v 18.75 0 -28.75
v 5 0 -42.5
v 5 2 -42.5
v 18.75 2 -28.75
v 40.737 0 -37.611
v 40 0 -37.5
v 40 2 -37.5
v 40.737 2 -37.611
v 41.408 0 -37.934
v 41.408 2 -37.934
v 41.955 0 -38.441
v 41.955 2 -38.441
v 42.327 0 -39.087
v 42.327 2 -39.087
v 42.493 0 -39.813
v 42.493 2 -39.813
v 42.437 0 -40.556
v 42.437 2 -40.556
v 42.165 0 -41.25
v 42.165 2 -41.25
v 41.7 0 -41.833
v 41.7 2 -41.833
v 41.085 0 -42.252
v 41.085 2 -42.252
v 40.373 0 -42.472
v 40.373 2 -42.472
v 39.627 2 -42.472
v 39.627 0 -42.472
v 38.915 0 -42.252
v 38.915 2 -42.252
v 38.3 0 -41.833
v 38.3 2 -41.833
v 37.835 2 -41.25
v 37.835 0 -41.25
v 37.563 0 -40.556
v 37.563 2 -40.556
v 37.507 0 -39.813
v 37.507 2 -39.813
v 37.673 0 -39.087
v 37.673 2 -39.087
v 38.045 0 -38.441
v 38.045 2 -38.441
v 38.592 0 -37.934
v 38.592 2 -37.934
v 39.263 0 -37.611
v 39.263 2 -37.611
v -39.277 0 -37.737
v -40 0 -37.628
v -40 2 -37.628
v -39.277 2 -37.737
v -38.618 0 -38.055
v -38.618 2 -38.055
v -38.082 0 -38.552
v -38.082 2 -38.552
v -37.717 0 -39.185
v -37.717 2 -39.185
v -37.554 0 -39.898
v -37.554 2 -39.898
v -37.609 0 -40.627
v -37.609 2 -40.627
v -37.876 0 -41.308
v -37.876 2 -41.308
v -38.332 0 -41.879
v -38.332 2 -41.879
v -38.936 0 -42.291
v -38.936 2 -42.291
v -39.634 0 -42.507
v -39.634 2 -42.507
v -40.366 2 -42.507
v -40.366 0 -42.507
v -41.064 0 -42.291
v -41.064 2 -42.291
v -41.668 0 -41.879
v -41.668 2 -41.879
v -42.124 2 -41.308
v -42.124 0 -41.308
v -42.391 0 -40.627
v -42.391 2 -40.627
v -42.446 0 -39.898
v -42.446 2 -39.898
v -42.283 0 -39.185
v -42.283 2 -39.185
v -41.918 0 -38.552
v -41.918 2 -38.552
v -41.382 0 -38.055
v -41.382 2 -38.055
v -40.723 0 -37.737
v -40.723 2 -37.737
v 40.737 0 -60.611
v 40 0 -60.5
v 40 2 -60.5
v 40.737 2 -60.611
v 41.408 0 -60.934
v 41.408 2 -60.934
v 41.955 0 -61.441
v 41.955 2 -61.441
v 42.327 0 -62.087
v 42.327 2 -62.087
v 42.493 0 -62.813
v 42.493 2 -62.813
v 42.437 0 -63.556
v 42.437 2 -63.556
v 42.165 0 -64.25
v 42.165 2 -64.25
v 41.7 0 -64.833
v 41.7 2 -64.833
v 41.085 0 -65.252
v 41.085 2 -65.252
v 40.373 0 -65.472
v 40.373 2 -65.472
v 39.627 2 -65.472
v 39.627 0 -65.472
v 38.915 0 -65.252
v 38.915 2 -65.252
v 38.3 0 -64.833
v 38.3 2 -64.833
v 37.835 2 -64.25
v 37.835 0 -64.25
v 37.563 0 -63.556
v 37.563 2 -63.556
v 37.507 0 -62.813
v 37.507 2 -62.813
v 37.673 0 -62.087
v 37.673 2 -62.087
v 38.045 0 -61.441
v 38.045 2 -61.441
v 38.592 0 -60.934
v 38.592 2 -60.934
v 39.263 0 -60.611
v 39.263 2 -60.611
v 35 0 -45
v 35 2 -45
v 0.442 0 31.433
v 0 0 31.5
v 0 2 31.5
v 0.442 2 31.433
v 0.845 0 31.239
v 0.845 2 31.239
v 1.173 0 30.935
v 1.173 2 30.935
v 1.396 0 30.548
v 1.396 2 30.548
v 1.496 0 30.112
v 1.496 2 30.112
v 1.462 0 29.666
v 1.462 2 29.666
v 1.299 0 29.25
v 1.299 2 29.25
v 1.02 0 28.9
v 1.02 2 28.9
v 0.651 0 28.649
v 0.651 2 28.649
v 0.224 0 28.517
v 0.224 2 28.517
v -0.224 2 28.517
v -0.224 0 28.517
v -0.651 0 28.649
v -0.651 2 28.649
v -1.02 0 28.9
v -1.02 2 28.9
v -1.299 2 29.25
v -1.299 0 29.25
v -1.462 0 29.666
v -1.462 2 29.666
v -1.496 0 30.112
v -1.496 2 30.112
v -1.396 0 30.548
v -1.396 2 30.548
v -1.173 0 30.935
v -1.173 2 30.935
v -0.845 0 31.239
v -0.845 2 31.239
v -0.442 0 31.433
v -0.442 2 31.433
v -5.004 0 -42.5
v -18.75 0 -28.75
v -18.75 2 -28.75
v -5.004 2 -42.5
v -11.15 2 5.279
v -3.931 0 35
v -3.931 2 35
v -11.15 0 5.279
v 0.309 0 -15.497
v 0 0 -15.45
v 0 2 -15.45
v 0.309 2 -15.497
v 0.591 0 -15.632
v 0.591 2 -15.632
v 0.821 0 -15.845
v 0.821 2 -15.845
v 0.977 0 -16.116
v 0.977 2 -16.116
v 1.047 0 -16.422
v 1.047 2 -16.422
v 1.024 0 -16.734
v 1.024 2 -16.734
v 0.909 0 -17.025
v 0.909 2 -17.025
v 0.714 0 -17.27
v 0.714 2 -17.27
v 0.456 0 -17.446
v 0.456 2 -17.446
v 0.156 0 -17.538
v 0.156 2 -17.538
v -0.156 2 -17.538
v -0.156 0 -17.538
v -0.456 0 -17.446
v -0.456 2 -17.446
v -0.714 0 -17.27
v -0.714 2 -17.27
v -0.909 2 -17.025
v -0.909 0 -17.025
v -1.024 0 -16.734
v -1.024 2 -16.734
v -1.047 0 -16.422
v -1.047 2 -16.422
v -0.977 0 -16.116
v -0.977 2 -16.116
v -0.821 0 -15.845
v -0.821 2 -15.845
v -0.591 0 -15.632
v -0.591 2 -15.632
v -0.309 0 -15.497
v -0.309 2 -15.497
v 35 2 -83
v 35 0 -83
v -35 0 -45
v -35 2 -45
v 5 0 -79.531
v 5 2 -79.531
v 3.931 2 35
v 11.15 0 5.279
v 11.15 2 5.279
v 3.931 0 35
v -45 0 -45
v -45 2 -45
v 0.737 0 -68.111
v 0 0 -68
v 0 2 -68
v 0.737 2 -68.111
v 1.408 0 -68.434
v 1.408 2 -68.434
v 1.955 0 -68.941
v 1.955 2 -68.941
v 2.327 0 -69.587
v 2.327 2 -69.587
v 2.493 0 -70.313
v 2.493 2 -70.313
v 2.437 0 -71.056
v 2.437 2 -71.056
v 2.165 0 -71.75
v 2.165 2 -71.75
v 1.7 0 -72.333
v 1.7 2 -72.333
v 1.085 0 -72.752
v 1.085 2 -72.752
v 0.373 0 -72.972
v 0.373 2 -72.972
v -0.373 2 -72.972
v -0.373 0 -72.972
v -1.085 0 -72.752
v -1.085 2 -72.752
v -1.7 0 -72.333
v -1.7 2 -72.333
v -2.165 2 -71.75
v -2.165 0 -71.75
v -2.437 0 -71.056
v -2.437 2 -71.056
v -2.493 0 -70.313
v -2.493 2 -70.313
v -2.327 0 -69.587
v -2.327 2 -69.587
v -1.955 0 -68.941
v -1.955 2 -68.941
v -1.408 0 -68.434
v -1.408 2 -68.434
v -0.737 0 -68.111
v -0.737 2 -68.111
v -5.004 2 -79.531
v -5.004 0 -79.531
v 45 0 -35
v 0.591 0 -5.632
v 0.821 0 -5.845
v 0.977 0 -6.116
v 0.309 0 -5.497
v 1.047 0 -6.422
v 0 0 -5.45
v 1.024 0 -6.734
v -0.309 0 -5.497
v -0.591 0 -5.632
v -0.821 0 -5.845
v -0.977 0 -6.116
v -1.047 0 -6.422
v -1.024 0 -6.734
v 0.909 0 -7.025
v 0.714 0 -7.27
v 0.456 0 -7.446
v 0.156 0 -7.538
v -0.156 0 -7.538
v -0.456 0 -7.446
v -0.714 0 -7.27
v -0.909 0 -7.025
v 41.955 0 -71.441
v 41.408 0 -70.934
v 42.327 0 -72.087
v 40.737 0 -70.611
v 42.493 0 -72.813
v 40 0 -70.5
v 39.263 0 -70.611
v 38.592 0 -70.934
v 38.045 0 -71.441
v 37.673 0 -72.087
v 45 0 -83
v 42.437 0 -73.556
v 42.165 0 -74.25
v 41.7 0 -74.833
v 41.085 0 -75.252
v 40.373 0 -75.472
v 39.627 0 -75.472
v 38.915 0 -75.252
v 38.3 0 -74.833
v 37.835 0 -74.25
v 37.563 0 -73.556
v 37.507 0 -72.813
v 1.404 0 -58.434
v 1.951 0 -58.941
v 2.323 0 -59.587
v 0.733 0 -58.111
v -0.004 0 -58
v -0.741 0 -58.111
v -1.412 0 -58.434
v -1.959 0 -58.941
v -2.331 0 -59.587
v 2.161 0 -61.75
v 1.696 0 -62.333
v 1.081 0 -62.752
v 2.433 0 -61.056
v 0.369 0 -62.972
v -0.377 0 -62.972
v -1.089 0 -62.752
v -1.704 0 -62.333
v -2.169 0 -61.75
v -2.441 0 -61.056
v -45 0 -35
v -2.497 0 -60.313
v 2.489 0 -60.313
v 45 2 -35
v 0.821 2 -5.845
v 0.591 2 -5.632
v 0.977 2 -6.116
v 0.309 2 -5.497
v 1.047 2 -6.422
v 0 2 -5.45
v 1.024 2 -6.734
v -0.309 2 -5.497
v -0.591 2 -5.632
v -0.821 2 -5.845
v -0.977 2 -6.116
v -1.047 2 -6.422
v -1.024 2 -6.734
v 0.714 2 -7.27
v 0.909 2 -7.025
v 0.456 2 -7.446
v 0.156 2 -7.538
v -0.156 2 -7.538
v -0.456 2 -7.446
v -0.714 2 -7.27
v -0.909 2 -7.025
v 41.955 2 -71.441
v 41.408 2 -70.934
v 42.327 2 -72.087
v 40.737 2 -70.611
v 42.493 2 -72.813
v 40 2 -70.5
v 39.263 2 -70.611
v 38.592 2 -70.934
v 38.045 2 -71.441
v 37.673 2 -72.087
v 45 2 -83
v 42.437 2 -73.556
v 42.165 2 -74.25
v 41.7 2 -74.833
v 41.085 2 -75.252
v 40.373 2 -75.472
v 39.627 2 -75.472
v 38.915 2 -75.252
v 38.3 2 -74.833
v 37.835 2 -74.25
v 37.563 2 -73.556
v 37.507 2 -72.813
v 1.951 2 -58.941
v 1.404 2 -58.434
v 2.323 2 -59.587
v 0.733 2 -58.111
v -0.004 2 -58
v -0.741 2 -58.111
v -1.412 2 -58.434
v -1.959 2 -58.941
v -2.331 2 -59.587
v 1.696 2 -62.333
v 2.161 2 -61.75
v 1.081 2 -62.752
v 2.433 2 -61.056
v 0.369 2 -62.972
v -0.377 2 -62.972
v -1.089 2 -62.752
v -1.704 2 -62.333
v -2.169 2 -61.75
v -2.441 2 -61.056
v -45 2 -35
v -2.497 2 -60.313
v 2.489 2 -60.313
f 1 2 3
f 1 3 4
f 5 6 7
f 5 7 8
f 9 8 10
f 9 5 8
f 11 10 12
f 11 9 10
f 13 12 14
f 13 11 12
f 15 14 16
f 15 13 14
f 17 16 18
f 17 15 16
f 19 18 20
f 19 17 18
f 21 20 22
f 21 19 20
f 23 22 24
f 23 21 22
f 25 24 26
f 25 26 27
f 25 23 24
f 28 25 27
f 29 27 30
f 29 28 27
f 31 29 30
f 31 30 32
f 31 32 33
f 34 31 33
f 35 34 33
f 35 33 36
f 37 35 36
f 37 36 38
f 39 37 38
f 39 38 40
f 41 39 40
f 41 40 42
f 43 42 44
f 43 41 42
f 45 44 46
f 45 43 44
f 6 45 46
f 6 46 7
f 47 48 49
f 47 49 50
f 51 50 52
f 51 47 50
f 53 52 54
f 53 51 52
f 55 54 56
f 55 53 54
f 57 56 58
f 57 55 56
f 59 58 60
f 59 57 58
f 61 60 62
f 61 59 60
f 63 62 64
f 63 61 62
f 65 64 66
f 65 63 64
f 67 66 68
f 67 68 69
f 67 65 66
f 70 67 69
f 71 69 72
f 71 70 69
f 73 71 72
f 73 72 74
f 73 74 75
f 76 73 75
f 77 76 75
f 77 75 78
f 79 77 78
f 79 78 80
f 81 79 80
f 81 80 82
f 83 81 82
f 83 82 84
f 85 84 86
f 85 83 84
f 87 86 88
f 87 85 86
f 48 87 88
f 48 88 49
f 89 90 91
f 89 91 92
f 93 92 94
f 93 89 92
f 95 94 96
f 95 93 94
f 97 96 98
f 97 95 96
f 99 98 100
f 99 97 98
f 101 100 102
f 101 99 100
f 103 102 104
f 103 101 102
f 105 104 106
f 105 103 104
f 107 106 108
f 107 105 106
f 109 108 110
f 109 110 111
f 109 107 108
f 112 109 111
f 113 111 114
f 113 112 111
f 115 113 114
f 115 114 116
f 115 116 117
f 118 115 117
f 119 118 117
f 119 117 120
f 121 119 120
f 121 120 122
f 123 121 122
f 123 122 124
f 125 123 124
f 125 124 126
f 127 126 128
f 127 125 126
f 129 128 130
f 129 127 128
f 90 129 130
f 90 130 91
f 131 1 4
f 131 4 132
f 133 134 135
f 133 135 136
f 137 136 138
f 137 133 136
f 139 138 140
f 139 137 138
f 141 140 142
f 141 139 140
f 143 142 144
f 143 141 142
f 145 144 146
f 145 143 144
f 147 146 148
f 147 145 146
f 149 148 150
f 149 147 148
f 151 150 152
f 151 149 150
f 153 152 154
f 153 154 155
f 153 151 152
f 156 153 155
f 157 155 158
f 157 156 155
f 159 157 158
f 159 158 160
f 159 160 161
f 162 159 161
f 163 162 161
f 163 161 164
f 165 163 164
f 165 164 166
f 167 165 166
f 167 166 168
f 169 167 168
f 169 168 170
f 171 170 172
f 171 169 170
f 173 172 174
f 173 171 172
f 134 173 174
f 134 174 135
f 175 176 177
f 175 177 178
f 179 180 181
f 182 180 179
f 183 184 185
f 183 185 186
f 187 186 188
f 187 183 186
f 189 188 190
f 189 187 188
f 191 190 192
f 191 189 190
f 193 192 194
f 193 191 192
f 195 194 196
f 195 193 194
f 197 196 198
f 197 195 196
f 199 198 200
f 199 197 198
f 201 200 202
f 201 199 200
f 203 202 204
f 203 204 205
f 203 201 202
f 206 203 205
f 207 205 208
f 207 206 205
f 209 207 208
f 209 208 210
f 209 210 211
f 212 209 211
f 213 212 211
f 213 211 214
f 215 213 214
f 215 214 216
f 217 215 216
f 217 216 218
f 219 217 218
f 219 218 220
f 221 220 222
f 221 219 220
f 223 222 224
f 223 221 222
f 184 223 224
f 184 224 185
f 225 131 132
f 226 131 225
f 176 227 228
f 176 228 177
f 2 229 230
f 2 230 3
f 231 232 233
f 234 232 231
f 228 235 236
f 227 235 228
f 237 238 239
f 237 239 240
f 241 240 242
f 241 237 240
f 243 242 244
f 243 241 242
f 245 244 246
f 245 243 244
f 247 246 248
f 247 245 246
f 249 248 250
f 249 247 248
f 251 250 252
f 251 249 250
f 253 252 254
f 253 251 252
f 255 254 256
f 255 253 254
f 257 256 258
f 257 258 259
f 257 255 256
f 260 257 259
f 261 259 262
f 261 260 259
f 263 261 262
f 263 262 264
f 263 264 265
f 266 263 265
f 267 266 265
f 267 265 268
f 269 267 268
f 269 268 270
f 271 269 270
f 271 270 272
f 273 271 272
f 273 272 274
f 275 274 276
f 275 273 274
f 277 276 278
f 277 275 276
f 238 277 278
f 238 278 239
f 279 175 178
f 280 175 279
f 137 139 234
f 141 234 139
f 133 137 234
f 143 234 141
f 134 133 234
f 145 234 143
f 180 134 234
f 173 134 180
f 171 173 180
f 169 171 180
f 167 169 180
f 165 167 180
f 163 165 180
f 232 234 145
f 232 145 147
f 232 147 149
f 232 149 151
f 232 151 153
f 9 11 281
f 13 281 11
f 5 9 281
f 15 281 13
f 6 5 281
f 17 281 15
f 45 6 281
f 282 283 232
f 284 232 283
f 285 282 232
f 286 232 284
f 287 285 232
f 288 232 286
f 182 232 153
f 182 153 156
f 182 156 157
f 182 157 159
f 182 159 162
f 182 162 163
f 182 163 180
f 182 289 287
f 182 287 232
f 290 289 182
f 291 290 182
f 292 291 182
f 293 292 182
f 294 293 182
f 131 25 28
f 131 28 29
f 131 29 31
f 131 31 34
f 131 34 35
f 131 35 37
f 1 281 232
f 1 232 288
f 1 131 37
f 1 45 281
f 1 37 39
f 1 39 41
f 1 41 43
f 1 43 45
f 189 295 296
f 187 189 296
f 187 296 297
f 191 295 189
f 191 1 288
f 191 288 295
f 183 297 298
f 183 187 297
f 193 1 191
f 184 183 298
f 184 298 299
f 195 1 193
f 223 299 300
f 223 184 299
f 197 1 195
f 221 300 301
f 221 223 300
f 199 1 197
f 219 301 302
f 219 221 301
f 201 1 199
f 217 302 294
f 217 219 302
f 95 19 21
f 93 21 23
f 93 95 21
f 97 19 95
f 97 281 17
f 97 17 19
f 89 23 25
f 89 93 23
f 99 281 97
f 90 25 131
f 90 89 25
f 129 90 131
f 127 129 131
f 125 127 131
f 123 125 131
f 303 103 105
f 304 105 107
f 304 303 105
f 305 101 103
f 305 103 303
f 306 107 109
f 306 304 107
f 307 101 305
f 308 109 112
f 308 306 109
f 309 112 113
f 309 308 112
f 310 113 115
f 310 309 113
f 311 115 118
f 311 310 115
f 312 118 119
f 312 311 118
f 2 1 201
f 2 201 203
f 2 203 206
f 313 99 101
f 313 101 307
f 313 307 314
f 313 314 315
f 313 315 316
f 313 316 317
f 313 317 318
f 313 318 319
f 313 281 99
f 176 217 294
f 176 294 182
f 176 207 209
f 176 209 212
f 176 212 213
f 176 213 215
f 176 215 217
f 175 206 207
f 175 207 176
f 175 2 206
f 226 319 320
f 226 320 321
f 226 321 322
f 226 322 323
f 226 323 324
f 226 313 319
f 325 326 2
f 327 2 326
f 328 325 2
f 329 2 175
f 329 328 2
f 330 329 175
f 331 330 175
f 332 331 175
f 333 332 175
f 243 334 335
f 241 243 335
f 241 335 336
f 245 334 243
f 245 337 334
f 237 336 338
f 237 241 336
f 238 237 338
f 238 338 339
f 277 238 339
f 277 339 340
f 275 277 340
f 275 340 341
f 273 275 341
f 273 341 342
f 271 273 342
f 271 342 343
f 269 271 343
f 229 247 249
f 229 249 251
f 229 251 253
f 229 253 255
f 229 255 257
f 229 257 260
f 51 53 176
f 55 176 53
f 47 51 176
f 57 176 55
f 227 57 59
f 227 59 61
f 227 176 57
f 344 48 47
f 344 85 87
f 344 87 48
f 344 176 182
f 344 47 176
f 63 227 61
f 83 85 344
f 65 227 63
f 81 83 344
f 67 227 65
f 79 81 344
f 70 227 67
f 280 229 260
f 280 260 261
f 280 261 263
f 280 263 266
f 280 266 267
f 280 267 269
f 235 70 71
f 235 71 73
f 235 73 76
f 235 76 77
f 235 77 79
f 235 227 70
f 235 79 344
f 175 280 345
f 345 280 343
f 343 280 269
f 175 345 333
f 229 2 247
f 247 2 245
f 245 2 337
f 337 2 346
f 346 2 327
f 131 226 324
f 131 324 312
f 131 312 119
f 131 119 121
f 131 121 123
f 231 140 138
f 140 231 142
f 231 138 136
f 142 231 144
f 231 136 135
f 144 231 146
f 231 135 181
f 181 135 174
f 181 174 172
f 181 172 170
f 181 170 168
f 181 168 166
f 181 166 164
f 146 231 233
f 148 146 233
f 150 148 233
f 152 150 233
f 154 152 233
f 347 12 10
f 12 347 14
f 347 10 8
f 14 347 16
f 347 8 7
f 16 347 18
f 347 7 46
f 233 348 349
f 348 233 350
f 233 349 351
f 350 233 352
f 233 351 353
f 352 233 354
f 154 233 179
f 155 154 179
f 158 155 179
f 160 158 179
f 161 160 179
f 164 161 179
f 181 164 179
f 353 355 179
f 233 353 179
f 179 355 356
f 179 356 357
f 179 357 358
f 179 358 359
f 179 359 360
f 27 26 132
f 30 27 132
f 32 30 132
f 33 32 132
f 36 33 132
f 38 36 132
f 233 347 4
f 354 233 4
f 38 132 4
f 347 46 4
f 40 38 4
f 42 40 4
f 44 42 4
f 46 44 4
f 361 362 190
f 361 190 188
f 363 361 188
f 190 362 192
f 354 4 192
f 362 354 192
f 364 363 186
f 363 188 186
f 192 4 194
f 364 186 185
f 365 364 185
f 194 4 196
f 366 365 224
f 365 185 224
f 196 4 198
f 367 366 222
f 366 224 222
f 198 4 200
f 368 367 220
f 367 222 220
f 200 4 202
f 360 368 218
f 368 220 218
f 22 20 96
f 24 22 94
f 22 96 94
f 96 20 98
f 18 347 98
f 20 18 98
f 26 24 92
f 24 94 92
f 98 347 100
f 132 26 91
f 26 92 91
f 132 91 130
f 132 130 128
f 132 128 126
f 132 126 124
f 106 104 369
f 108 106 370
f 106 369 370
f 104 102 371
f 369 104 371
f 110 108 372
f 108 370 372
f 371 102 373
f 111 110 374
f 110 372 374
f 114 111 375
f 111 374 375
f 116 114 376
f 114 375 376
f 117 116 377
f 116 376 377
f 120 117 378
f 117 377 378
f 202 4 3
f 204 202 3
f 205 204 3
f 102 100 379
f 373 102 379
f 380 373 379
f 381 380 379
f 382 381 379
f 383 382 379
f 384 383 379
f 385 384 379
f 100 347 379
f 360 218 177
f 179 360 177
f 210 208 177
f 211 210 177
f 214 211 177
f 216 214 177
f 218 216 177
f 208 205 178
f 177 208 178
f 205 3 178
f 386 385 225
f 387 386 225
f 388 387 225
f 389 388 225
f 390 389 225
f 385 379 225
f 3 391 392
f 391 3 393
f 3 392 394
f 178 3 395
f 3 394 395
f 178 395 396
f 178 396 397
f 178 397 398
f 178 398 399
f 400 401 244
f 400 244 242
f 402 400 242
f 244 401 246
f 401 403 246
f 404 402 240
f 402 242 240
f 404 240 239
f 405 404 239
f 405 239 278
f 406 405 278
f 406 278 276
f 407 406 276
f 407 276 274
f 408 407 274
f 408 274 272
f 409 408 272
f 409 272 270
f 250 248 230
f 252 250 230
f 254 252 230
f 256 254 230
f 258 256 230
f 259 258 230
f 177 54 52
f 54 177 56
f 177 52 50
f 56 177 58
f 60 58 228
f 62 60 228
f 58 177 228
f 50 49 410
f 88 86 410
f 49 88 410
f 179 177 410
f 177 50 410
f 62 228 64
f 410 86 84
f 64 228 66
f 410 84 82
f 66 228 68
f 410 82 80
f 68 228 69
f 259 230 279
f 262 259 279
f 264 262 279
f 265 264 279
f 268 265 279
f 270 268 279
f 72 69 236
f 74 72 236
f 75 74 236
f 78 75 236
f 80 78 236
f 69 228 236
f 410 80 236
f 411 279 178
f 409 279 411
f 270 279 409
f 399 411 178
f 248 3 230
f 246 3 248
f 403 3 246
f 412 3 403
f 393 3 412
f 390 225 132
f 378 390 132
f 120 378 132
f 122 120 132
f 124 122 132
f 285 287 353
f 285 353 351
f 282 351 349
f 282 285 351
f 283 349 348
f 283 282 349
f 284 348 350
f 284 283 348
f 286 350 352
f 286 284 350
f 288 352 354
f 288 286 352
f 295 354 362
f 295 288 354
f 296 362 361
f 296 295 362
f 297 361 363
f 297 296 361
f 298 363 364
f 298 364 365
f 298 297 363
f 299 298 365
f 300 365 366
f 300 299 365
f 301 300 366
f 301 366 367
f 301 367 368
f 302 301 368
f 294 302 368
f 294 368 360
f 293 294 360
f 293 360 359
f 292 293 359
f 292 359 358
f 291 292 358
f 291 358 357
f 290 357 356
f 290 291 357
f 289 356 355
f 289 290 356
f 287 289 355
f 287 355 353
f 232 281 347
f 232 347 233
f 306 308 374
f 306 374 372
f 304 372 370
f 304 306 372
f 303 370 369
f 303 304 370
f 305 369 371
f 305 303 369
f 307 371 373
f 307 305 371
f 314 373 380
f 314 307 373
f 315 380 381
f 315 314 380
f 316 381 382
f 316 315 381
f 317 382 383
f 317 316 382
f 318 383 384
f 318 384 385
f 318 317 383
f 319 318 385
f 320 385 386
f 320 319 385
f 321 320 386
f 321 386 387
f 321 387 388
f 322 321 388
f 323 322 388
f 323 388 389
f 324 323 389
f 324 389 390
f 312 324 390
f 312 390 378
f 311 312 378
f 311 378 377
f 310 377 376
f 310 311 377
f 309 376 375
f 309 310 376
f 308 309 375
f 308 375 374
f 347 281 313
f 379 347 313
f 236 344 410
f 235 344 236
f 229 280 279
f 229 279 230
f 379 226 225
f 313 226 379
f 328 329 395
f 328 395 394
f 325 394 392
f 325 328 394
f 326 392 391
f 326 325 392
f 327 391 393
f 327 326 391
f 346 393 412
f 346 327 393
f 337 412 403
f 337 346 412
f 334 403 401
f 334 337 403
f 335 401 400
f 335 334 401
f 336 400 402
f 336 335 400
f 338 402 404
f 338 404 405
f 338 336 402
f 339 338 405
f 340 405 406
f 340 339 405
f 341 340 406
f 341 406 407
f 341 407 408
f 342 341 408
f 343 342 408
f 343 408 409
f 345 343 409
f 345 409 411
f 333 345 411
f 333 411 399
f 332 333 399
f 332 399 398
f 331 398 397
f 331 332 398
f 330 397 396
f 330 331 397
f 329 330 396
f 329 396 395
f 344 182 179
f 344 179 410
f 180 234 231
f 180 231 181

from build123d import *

# Parameters (mm, degrees)
SKETCH1_R           = 2.452812329
SKETCH1_R_2         = 2.5
SKETCH1_R_3         = 1.05
SKETCH1_R_4         = 1.5
BOSS_EXTRUDE1_DEPTH = 2


with BuildPart() as part:
    # Sketch1 → Boss-Extrude1 (new body)
    with BuildSketch(Plane(origin=(0, 0, 0), x_dir=(1, 0, 0), z_dir=(0, 1, 0))):
        Polygon((45, 45), (45, 35), (11.149880928, -5.279298766), (3.930911566, -35), (-3.930911566, -35), (-11.149880928, -5.279298766), (-45, 35), (-45, 45), (-35, 45), (-18.75, 28.75), (-5.004014664, 42.5), (-5.004014664, 79.531475099), (5, 79.531475099), (5, 42.5), (18.75, 28.75), (35, 45), (35, 83), (45, 83), align=None)
        with Locations(Location((-39.999958798, 40.081193315, 0), (0, 0, 270))):
            Circle(SKETCH1_R, mode=Mode.SUBTRACT)
        with Locations(Location((40, 40, 0), (0, 0, 270))):
            Circle(SKETCH1_R_2, mode=Mode.SUBTRACT)
        with Locations(Location((40, 63, 0), (0, 0, 270))):
            Circle(SKETCH1_R_2, mode=Mode.SUBTRACT)
        with Locations(Location((40, 73, 0), (0, 0, 270))):
            Circle(SKETCH1_R_2, mode=Mode.SUBTRACT)
        with Locations(Location((-0.004014664, 60.5, 0), (0, 0, 270))):
            Circle(SKETCH1_R_2, mode=Mode.SUBTRACT)
        with Locations(Location((0, 70.499999194, 0), (0, 0, 270))):
            Circle(SKETCH1_R_2, mode=Mode.SUBTRACT)
        with Locations(Location((0, 6.5, 0), (0, 0, 270))):
            Circle(SKETCH1_R_3, mode=Mode.SUBTRACT)
        with Locations(Location((0, 16.5, 0), (0, 0, 270))):
            Circle(SKETCH1_R_3, mode=Mode.SUBTRACT)
        with Locations(Location((0, -30, 0), (0, 0, 270))):
            Circle(SKETCH1_R_4, mode=Mode.SUBTRACT)
    extrude(amount=BOSS_EXTRUDE1_DEPTH)


solid = part.part
